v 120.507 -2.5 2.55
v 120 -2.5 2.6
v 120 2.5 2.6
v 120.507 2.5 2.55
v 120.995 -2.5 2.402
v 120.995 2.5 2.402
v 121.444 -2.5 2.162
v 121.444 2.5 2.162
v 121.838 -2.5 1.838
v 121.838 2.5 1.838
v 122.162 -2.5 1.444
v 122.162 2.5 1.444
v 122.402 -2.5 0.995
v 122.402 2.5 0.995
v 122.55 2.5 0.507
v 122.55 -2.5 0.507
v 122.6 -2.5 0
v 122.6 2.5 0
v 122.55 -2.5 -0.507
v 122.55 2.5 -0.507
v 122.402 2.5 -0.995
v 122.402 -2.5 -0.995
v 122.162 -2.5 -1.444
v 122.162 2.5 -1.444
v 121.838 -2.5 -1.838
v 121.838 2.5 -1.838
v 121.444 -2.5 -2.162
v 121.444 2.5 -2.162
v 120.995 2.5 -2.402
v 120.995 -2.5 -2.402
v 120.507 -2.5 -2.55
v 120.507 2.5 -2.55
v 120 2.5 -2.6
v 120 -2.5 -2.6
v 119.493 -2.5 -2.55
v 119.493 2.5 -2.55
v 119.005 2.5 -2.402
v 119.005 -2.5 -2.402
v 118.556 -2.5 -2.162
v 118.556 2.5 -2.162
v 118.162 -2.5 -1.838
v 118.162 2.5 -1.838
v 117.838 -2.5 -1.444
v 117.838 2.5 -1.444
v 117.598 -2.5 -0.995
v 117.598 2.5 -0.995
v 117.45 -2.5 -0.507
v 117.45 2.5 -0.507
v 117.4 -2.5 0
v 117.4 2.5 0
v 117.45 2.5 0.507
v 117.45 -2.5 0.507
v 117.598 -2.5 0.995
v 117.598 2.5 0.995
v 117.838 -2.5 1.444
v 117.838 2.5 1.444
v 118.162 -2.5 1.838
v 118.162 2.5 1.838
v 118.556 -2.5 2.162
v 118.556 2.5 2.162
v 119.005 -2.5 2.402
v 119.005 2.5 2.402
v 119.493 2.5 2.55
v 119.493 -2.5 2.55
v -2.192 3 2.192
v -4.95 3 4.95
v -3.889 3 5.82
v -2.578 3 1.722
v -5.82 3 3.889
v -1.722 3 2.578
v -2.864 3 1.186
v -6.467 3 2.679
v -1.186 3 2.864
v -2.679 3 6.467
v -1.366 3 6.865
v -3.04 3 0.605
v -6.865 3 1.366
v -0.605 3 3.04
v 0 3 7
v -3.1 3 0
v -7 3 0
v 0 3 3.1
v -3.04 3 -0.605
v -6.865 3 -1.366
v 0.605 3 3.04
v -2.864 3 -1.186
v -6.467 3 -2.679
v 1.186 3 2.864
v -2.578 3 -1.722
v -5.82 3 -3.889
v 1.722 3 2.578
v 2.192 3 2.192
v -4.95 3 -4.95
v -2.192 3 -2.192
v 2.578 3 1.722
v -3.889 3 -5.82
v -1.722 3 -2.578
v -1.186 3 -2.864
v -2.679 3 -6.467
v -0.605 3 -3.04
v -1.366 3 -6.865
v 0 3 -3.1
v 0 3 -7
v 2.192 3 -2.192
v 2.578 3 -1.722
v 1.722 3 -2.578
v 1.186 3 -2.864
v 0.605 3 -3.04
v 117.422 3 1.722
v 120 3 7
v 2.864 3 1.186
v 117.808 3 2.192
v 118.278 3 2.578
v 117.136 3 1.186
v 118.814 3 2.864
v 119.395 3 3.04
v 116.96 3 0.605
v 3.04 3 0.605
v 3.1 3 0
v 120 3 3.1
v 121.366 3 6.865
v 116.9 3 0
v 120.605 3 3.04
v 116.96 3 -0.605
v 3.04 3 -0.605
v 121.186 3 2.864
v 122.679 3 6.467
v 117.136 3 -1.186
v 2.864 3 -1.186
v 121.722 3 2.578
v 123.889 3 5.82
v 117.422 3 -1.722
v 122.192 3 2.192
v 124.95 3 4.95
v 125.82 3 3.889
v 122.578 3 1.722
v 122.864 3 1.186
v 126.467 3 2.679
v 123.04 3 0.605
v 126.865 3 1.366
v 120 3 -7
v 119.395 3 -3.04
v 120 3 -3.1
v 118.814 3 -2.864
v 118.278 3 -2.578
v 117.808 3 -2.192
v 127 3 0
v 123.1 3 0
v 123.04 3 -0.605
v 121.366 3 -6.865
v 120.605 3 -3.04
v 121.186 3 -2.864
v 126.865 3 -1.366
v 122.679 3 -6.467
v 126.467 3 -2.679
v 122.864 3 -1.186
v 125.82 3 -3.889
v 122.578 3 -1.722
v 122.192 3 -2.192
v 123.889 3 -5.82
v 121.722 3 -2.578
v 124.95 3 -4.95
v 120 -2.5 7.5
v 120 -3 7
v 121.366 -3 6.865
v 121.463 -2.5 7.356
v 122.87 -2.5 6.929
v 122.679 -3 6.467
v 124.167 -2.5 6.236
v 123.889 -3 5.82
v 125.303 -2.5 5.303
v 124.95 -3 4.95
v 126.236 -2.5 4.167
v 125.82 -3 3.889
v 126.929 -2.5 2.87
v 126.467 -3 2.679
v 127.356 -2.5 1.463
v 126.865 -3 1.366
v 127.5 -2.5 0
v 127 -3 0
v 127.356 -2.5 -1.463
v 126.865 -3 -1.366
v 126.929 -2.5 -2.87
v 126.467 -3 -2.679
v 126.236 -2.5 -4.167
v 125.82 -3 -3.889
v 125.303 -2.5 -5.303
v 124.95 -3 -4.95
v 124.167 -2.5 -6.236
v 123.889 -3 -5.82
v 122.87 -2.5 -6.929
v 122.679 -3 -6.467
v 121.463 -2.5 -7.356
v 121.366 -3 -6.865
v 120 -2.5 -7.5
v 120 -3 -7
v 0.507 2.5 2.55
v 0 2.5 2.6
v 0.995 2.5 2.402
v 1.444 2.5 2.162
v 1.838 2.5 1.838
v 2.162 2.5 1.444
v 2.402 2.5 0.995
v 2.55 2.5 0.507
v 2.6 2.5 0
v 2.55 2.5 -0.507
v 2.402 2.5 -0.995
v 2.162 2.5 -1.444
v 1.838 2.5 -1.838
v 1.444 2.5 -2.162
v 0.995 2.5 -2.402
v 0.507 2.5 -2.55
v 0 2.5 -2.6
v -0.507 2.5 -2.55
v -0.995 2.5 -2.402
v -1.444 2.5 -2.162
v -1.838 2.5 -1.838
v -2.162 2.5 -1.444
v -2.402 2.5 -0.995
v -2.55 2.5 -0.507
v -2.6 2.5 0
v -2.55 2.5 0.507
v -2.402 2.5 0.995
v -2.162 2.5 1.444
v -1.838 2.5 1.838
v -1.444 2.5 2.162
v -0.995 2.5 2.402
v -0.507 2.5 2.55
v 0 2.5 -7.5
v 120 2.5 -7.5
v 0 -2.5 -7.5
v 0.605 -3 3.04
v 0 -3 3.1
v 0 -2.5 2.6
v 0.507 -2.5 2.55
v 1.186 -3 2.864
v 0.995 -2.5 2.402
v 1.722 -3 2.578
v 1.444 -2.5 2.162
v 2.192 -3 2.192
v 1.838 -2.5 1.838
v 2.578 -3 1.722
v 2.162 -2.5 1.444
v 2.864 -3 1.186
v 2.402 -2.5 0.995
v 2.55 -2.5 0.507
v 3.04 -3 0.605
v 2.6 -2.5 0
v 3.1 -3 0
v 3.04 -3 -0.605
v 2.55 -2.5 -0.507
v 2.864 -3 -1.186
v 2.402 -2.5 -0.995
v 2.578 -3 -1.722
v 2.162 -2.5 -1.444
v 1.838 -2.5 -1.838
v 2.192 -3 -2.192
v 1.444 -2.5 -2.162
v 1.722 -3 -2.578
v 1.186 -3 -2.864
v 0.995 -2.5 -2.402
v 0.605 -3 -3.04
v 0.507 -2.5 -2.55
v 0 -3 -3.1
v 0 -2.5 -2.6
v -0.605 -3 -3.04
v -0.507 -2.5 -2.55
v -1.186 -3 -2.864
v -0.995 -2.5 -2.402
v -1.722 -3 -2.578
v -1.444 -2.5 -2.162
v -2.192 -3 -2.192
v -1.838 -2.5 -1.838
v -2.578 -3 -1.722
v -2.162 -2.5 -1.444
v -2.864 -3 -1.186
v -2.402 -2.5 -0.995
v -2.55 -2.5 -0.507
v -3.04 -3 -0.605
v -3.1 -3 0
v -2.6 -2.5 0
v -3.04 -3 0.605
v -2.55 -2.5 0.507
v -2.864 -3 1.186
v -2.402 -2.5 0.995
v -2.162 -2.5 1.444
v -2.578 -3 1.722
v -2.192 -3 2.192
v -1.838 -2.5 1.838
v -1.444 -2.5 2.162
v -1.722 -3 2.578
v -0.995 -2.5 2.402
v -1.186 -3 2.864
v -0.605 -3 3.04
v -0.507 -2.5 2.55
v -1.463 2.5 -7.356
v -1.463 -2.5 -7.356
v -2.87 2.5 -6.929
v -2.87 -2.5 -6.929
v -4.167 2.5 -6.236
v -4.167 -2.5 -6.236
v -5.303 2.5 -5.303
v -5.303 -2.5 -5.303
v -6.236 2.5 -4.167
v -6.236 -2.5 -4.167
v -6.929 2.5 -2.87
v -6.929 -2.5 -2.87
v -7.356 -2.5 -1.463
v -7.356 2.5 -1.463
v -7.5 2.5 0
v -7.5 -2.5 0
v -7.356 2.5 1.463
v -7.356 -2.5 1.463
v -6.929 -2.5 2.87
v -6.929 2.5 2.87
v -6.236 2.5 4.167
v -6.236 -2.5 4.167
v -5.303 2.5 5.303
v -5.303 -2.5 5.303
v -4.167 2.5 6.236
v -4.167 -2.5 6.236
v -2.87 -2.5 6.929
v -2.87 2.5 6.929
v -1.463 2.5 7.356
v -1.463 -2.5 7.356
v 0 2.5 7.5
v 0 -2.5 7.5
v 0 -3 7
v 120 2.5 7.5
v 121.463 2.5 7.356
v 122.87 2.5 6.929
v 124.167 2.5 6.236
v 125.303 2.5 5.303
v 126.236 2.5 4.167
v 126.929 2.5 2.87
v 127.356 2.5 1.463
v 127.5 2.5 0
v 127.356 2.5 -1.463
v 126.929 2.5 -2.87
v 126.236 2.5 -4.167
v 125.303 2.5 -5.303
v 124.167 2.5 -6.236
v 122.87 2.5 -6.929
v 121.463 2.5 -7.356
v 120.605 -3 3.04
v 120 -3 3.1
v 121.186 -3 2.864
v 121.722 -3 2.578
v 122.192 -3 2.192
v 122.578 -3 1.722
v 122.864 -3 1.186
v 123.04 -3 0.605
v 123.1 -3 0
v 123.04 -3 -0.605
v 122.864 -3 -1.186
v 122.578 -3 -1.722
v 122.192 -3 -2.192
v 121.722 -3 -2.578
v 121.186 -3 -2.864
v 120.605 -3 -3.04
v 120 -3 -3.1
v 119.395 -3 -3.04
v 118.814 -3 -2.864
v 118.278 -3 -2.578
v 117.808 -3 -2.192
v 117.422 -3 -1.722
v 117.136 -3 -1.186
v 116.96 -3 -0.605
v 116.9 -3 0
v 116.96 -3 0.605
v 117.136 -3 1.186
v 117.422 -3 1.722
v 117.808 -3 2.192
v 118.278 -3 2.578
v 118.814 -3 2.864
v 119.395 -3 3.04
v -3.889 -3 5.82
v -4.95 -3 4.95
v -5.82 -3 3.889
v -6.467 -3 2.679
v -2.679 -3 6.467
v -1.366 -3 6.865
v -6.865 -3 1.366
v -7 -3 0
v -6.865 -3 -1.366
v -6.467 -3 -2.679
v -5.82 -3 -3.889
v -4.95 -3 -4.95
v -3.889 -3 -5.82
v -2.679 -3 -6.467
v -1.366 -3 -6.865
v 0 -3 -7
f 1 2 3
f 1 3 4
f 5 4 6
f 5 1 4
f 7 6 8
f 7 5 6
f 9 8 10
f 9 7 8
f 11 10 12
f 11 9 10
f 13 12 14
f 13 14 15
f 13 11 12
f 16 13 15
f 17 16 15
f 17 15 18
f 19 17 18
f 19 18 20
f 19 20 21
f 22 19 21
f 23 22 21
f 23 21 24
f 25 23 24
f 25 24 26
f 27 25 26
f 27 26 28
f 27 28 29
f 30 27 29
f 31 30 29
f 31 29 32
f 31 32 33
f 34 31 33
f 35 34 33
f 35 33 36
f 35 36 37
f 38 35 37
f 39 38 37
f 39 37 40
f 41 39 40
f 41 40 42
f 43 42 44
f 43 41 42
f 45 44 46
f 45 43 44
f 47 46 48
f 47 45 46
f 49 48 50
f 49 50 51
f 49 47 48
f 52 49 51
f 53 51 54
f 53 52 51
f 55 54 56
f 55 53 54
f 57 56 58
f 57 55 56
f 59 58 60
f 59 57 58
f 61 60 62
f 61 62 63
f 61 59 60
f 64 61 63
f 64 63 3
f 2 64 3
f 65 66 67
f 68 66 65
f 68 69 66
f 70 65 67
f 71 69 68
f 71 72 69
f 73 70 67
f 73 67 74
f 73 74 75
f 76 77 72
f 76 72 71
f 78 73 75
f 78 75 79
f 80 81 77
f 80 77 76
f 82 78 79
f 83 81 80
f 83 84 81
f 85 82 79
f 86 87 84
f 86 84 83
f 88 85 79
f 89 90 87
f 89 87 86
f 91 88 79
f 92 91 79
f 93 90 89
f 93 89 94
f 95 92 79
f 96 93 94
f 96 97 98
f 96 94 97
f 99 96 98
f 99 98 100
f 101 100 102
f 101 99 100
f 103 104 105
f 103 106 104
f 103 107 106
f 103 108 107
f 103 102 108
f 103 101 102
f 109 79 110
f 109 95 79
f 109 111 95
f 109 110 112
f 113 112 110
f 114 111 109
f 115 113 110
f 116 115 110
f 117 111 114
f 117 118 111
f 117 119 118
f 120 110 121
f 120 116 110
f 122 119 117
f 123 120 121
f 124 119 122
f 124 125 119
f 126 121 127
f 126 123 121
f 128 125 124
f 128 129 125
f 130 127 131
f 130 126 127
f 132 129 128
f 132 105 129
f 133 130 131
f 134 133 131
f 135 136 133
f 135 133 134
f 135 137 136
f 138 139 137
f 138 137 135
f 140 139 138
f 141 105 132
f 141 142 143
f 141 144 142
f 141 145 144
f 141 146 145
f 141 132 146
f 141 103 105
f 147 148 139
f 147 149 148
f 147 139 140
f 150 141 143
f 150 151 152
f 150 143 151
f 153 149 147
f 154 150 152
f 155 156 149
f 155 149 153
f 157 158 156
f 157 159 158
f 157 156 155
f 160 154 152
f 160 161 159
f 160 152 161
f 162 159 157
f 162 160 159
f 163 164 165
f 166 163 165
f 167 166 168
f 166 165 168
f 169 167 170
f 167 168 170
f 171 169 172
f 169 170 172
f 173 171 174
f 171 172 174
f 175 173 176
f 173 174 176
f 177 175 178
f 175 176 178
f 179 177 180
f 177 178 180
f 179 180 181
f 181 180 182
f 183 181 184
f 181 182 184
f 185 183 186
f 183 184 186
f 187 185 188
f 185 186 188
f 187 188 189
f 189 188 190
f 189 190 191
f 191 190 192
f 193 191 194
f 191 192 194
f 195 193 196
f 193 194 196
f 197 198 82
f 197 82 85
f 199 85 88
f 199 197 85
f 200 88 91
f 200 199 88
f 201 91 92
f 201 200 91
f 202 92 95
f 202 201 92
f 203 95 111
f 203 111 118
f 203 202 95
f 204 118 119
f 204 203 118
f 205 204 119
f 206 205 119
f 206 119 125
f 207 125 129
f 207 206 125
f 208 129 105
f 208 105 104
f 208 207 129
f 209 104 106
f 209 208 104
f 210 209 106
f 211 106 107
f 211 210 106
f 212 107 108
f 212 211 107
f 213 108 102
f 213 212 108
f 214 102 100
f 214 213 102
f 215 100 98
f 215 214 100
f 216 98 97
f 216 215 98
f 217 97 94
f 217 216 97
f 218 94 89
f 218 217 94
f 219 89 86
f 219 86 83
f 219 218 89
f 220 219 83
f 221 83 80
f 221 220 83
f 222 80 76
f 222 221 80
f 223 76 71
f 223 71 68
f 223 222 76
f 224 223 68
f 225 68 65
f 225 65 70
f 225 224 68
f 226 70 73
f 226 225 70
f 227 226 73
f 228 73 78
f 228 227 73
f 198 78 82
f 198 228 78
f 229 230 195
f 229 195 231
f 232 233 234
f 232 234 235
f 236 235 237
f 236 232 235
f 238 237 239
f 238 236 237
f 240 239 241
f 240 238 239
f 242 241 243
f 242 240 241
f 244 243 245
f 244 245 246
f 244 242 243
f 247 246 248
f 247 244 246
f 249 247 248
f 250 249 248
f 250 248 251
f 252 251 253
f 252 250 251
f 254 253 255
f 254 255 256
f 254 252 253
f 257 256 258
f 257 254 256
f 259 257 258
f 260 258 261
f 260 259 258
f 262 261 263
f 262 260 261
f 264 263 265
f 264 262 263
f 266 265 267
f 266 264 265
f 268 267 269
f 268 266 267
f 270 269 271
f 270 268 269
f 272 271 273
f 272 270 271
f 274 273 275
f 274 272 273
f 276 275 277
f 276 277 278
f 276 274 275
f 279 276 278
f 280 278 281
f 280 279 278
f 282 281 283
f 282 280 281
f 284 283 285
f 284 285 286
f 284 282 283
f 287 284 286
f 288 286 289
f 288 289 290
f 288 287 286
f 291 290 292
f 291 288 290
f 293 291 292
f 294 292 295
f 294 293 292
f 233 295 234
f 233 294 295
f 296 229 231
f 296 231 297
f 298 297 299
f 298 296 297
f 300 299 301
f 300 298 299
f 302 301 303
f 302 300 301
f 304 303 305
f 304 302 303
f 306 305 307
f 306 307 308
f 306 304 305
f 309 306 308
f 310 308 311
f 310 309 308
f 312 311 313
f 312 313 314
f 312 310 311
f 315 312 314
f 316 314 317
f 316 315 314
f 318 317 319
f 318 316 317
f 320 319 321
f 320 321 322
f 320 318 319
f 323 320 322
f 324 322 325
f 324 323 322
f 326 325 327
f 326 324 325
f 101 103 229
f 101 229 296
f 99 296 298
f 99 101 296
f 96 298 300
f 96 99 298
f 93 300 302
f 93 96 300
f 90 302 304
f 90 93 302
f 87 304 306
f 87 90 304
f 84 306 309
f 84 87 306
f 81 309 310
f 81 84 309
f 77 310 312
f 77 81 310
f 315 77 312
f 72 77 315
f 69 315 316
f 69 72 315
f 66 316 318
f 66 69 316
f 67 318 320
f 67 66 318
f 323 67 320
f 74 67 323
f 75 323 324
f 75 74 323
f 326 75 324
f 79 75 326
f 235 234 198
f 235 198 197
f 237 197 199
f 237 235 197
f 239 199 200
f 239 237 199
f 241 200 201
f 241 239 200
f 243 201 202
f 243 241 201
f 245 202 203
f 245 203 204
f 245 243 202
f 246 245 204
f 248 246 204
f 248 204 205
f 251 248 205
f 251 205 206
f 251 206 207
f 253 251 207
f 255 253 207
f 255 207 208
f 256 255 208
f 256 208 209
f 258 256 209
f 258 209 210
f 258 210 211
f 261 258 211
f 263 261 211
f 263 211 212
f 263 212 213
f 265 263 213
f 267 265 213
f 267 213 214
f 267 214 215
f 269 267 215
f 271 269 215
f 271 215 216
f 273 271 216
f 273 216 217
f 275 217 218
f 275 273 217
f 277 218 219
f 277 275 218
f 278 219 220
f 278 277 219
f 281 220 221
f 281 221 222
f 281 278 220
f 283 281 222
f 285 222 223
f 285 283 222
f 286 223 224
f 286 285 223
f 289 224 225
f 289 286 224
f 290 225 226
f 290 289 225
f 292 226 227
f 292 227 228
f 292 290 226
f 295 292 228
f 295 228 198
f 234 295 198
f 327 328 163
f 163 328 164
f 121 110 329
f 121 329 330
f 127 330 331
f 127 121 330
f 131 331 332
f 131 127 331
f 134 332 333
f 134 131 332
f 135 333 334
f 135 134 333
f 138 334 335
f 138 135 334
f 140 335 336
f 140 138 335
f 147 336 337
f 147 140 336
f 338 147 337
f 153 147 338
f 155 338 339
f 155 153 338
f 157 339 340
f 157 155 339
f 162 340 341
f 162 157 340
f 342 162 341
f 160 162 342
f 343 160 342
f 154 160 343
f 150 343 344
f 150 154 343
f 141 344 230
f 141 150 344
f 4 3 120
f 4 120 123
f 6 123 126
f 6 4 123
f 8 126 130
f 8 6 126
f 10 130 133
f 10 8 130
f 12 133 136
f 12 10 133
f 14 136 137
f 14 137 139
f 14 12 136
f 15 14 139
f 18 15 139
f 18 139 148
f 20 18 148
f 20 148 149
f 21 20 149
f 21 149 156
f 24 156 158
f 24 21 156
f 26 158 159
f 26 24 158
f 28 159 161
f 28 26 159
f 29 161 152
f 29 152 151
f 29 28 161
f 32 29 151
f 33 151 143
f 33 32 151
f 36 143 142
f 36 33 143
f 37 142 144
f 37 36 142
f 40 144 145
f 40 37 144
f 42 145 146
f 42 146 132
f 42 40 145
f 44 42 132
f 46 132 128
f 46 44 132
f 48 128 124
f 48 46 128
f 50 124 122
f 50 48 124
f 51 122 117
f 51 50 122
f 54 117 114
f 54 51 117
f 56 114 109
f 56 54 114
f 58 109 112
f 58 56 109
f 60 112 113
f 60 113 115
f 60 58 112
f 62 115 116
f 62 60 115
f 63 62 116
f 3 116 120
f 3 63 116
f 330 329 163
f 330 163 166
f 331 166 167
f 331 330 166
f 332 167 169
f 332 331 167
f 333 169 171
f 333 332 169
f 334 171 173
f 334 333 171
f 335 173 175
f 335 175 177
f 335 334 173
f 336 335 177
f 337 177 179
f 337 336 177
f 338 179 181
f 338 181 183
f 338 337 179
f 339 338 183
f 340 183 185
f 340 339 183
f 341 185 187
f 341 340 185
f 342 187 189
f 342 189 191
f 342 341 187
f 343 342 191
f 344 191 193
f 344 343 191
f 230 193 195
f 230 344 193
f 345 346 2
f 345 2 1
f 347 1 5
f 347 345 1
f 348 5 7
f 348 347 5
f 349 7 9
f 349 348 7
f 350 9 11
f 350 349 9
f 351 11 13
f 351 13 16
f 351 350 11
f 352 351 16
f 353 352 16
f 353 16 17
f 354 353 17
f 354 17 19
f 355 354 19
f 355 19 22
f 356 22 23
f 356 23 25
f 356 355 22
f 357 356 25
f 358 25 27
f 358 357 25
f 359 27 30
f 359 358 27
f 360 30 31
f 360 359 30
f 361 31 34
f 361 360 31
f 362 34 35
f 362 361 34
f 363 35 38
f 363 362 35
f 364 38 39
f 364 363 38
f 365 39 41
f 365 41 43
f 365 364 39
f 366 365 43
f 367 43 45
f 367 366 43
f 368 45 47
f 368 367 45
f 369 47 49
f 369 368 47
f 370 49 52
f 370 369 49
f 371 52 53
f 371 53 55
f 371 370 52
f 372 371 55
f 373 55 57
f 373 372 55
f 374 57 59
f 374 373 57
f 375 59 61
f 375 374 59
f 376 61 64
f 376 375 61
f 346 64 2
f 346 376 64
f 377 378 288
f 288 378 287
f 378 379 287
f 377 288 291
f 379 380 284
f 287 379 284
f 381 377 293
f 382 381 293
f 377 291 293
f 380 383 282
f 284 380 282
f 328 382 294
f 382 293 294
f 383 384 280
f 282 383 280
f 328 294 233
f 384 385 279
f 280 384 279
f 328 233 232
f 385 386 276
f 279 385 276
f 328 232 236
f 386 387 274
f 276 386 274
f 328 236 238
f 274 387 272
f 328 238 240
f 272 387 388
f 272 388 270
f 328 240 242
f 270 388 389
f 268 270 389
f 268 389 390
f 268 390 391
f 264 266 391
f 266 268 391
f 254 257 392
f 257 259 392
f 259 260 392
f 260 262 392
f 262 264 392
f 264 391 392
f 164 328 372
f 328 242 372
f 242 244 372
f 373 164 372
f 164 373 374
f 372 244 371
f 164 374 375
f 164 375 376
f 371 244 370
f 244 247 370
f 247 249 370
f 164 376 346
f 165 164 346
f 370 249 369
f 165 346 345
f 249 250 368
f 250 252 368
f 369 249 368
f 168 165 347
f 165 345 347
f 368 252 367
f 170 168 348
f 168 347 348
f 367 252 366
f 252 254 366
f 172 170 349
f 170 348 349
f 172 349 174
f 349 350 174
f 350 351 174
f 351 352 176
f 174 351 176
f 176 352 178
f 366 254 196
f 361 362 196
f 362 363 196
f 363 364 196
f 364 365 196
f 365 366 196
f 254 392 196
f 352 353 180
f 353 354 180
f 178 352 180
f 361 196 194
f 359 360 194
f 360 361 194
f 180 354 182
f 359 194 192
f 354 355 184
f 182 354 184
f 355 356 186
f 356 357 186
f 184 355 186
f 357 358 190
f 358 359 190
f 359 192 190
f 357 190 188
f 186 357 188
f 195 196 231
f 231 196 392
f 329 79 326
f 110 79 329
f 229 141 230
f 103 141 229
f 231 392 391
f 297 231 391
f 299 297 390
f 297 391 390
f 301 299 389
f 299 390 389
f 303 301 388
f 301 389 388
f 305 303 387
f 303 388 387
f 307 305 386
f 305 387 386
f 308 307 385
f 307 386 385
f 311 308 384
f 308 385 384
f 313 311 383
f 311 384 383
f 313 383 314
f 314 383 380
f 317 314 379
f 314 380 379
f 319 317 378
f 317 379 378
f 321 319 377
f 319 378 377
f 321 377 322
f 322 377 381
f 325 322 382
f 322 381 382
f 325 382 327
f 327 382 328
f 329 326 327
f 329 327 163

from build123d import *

# Parameters (mm, degrees)
SKETCH1_R           = 2.6
BOSS_EXTRUDE1_DEPTH = 3
CHAMFER1_SIZE       = 0.5


with BuildPart() as part:
    # Sketch1 → Boss-Extrude1 (new, symmetric)
    with BuildSketch(Plane(origin=(0, 0, 0), x_dir=(1, 0, 0), z_dir=(0, 1, 0))):
        with BuildLine():
            Line((0, -7.5), (120, -7.5))
            ThreePointArc((120, -7.5), (127.5, 0), (120, 7.5))
            Line((120, 7.5), (0, 7.5))
            ThreePointArc((0, 7.5), (-7.5, 0), (0, -7.5))
        make_face()
        with Locations(Location((0, 0, 0), (0, 0, 270))):
            Circle(SKETCH1_R, mode=Mode.SUBTRACT)
        with Locations(Location((120, 0, 0), (0, 0, 270))):
            Circle(SKETCH1_R, mode=Mode.SUBTRACT)
    extrude(amount=BOSS_EXTRUDE1_DEPTH, both=True)

    # Chamfer1
    chamfer1_edges = [part.edges().sort_by_distance(p)[0] for p in [
        (120, -3, -2.6),
        (0, -3, -2.6),
        (120, 3, -2.6),
        (60, 3, 7.5),
        (127.5, 3, 0),
        (60, 3, -7.5),
        (-7.5, 3, 0),
        (0, 3, -2.6),
        (-7.5, -3, 0),
        (60, -3, -7.5),
        (127.5, -3, 0),
        (60, -3, 7.5),
    ]]
    chamfer(chamfer1_edges, length=CHAMFER1_SIZE)


solid = part.part
